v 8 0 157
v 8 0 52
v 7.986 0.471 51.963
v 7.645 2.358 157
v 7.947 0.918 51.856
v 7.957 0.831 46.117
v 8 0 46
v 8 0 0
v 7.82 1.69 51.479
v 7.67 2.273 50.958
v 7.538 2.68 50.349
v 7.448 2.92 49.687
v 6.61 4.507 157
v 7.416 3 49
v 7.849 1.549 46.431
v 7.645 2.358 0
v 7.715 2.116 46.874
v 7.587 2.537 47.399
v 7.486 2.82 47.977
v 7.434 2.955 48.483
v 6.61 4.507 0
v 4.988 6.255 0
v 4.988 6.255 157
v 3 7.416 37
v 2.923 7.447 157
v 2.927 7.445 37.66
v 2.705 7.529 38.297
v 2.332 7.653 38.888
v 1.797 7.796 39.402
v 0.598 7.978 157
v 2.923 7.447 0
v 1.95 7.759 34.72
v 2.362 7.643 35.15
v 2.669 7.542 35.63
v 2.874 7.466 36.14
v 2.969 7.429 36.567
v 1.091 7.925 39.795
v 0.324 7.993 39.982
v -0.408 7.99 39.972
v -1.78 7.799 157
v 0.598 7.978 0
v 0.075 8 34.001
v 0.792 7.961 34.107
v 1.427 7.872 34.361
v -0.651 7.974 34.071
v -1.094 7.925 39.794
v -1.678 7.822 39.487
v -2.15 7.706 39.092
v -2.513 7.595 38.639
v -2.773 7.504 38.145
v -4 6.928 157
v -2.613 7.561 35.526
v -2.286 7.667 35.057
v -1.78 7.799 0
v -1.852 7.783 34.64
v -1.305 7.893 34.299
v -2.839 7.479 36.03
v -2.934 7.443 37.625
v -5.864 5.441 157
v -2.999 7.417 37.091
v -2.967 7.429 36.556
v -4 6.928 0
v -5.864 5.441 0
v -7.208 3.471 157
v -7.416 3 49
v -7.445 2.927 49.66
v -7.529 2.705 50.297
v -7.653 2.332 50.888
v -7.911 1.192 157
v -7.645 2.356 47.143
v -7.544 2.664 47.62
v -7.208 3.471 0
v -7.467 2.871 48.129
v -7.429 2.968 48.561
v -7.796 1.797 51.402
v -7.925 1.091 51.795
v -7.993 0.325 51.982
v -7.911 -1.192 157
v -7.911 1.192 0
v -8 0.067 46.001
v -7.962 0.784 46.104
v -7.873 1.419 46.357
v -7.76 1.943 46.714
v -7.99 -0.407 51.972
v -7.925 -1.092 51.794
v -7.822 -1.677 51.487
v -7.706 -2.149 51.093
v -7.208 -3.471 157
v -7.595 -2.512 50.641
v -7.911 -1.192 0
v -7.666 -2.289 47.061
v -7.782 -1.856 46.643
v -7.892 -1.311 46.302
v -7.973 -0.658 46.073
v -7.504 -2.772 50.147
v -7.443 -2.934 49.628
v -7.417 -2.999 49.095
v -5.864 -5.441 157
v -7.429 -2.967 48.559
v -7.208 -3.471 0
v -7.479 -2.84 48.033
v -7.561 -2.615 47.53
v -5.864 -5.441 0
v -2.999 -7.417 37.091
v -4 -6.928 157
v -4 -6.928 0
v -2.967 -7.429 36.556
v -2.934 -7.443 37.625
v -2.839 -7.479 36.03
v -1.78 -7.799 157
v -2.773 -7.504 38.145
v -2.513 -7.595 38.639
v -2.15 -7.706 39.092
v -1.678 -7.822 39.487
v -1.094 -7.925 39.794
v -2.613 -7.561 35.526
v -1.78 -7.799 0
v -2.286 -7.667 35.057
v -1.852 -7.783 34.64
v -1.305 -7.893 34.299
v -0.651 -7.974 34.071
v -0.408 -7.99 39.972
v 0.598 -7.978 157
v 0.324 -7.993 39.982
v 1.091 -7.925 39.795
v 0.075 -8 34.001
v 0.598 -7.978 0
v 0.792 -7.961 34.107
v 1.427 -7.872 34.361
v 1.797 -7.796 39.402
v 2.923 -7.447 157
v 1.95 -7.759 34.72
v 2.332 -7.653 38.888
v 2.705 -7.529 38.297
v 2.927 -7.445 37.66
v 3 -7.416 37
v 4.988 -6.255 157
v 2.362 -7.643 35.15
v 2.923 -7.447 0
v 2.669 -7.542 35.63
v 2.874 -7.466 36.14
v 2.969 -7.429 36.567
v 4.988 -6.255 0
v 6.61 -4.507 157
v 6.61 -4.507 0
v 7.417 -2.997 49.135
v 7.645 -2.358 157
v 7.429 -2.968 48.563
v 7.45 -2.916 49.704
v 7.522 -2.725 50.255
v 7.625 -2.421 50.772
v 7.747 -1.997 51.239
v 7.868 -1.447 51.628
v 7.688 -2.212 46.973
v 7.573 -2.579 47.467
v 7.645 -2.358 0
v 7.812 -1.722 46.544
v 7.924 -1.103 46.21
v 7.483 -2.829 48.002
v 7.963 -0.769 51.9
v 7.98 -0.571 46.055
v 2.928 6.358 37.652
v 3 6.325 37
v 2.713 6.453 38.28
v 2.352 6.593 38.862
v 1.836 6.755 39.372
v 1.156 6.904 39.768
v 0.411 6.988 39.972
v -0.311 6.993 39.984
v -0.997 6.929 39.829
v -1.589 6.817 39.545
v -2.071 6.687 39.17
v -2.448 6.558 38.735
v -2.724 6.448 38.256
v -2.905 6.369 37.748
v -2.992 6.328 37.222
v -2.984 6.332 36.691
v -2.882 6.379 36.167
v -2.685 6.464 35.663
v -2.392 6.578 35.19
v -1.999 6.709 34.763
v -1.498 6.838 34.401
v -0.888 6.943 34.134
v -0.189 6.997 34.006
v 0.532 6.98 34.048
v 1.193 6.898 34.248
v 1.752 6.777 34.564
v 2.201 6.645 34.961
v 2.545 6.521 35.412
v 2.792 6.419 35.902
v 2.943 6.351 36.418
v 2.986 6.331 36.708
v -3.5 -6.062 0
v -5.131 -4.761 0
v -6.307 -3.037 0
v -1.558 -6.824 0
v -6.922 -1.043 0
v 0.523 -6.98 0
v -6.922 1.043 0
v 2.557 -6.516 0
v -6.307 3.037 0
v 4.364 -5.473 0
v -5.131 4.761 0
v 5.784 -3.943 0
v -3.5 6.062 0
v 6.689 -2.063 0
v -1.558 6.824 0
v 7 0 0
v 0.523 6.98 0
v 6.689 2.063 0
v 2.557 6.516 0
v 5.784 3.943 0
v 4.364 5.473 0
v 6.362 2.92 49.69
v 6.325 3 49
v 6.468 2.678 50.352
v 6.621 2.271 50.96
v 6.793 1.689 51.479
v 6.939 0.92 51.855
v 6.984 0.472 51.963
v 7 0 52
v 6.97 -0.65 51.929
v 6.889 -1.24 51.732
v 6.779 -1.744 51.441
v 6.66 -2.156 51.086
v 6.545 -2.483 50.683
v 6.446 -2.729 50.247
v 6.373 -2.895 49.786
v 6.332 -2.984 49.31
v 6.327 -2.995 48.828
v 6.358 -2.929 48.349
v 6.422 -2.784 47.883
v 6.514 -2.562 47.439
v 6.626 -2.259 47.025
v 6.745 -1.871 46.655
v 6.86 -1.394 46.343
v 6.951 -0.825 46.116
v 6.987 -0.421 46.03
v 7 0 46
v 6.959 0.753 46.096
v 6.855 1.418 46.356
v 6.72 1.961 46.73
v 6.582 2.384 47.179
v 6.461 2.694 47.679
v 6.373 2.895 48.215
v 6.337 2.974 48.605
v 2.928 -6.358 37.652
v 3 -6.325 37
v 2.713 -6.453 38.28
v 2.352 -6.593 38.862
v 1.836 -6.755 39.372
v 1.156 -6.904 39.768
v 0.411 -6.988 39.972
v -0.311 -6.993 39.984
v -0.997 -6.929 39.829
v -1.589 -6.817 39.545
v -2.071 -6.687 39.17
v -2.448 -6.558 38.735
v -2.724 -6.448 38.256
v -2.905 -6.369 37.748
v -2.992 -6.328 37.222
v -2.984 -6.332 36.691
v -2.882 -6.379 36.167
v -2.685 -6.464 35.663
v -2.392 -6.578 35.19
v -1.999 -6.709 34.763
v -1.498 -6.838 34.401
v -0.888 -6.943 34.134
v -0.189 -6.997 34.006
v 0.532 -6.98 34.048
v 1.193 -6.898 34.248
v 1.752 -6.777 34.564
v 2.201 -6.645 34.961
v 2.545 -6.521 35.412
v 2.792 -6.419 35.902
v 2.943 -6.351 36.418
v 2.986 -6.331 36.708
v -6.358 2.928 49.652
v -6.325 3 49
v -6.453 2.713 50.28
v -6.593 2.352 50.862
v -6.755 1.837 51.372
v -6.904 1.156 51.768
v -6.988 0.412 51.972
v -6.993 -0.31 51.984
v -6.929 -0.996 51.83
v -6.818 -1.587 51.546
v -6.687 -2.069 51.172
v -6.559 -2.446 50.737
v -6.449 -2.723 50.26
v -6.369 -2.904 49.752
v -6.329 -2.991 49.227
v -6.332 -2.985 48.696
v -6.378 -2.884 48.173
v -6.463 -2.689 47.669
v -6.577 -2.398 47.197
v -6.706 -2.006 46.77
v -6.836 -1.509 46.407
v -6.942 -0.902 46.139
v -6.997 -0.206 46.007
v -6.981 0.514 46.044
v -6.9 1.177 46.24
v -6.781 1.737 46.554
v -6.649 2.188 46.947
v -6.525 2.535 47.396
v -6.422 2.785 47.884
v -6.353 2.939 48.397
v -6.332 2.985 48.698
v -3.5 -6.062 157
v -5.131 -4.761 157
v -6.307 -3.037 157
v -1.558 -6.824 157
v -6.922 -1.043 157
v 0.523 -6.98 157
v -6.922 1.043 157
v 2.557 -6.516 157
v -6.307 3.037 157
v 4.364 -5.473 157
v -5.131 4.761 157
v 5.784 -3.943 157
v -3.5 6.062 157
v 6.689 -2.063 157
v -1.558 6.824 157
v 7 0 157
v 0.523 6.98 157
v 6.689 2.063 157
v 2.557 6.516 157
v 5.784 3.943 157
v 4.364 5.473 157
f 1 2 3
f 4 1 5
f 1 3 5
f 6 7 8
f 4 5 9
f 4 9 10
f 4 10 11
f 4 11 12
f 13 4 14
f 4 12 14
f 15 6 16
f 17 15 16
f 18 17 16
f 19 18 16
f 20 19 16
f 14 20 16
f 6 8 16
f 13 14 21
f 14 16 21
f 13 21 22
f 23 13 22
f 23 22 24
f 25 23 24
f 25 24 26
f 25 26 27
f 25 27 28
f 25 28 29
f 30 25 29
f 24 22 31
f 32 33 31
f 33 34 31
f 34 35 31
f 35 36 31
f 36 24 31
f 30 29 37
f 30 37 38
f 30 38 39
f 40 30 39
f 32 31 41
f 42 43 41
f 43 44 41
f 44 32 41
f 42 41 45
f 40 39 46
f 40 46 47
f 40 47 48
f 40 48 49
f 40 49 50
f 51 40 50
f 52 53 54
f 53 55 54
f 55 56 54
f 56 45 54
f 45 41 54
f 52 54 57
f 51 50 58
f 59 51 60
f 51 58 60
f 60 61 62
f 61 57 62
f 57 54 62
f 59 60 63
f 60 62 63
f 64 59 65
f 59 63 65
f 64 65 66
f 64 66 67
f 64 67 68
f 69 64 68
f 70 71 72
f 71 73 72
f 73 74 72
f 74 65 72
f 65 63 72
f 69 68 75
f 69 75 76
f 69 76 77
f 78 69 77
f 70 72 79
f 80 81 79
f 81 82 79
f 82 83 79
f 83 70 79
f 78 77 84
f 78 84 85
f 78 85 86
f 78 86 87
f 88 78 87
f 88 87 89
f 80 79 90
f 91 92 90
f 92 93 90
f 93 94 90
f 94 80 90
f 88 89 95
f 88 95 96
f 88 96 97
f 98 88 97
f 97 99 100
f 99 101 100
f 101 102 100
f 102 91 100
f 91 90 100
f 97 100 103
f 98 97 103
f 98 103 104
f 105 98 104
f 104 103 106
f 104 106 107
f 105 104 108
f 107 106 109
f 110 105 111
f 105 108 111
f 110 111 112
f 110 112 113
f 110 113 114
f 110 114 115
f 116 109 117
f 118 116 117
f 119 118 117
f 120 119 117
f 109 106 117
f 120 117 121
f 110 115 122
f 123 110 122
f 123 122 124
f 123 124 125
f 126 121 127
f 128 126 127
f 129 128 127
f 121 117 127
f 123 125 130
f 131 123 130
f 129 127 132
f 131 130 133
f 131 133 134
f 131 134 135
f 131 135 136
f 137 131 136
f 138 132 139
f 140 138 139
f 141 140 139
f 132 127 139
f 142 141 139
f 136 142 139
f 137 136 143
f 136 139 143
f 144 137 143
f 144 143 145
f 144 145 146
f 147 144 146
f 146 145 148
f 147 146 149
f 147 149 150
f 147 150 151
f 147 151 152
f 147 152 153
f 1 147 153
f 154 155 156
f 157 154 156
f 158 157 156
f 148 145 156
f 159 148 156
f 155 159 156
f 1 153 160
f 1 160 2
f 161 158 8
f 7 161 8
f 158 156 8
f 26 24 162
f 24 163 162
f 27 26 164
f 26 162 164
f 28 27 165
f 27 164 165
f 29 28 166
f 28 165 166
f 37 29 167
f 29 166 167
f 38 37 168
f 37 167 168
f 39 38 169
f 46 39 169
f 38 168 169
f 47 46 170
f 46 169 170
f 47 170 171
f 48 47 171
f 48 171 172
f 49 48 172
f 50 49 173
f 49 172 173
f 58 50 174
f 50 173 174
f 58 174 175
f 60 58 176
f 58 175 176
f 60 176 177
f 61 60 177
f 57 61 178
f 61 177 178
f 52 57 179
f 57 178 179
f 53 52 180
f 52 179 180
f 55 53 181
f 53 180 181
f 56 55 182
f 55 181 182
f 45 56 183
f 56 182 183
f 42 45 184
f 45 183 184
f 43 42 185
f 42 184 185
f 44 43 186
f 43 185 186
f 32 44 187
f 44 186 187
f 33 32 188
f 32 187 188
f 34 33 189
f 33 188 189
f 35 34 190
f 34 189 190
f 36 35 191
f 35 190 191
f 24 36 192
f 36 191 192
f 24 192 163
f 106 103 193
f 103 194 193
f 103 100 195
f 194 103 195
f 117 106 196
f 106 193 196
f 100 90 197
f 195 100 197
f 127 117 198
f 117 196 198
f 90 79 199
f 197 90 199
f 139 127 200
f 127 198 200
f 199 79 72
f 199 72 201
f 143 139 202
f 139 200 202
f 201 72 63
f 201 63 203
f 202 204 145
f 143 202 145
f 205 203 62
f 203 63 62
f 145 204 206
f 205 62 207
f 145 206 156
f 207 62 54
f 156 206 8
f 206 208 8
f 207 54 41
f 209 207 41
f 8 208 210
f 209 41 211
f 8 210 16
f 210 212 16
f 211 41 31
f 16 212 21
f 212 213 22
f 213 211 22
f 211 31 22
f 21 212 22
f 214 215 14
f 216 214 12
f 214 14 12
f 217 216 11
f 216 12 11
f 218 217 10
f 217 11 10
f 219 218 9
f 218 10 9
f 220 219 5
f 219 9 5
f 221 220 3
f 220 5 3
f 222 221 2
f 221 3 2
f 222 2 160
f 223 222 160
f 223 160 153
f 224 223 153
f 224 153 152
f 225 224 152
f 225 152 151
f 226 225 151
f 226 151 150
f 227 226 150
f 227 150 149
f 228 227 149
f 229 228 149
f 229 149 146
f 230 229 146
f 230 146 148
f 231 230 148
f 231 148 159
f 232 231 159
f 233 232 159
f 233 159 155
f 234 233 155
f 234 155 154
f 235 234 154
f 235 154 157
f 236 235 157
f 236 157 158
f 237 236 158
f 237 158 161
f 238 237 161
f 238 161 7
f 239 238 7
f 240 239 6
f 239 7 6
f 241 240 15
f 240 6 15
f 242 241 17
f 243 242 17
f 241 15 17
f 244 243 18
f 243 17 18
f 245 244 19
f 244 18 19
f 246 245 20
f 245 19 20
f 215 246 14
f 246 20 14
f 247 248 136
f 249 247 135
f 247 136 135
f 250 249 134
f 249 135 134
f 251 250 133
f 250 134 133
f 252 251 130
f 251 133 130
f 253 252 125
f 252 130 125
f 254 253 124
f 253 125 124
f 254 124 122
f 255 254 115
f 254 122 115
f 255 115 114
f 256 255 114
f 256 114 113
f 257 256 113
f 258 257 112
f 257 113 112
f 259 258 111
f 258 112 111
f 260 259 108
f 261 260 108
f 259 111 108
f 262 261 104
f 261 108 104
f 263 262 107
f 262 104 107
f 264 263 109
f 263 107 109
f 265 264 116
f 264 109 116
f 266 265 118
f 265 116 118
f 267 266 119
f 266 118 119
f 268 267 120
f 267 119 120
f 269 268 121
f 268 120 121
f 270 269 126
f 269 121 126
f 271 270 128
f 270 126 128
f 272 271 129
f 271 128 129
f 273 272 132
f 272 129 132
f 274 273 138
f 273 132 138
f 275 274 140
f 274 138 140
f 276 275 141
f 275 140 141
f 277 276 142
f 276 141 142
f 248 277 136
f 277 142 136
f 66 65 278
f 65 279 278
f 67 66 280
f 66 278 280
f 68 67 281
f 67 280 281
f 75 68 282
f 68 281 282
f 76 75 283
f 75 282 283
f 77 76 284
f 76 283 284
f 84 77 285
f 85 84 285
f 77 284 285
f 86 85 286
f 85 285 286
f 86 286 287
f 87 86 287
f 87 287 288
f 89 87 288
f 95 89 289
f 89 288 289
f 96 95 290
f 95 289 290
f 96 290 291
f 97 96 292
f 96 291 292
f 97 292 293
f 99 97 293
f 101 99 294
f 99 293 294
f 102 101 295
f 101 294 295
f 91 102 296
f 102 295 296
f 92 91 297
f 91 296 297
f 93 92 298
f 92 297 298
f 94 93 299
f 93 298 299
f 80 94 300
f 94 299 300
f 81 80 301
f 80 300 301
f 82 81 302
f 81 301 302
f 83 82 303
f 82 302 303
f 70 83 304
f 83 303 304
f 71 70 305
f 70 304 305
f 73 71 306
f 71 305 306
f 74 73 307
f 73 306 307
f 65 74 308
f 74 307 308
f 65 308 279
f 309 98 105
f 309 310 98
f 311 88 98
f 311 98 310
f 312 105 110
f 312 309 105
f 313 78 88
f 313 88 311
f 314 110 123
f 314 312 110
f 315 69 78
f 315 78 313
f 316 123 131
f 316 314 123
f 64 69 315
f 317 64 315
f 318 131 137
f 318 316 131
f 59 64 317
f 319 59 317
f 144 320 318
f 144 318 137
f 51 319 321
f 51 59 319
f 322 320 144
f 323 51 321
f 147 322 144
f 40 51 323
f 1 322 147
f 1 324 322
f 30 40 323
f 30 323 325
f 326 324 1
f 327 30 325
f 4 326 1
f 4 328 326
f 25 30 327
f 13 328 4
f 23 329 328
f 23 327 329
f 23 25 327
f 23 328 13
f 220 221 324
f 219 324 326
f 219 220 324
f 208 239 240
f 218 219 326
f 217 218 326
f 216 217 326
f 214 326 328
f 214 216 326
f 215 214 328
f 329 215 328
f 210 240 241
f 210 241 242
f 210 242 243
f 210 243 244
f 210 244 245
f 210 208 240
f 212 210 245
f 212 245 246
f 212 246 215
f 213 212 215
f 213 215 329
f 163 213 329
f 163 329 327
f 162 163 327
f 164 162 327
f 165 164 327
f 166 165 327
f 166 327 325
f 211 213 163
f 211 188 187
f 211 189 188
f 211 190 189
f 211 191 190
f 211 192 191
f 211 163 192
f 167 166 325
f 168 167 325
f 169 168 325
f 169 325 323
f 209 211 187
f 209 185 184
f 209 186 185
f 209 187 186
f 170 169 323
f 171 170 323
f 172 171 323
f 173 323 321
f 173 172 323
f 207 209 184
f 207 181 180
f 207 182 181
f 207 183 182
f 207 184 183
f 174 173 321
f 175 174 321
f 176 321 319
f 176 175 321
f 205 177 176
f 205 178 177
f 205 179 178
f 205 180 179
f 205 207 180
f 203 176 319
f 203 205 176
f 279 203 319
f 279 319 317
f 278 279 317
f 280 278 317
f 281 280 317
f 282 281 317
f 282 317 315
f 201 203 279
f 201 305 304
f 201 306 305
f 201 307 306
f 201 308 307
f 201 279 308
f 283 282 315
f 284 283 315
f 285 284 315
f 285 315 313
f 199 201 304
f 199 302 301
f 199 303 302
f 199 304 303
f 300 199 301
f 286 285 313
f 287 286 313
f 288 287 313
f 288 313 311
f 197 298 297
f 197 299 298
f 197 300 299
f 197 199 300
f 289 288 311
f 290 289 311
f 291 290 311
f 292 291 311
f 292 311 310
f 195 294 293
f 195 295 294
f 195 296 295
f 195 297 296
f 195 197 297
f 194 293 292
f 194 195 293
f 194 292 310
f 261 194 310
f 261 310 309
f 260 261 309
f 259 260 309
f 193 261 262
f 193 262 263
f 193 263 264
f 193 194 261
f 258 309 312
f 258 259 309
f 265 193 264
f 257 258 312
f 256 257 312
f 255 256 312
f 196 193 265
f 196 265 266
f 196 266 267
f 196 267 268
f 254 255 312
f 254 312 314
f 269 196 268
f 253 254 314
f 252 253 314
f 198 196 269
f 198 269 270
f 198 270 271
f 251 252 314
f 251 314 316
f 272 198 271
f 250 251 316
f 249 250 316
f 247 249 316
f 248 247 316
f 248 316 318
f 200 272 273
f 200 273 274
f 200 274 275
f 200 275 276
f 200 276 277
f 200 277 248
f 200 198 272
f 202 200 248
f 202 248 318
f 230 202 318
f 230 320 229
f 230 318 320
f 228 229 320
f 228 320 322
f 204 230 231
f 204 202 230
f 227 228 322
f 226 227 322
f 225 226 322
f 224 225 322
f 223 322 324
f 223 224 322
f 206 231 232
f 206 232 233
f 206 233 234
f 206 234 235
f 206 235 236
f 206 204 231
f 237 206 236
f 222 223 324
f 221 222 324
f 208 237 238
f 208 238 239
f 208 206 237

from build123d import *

# Parameters (mm, degrees)
F0_R     = 8
F0_R_2   = 7
F1_DEPTH = 157
F2_R     = 3
F3_DEPTH = 25
F4_R     = 3
F5_DEPTH = 12.5


with BuildPart() as f1:
    # F0 (on Top) → F1 (new body)
    with BuildSketch(Plane.XY):
        Circle(F0_R)
        Circle(F0_R_2, mode=Mode.SUBTRACT)
    extrude(amount=F1_DEPTH)

    # F2 (on Front) → F3 (cut, symmetric)
    with BuildSketch(Plane.XZ):
        with Locations((0, 37)):
            Circle(F2_R)
    extrude(amount=F3_DEPTH, both=True, mode=Mode.SUBTRACT)

    # F4 (on Right) → F5 (cut, symmetric)
    with BuildSketch(Plane.YZ):
        with Locations((0, 49)):
            Circle(F4_R)
    extrude(amount=F5_DEPTH, both=True, mode=Mode.SUBTRACT)


solid = f1.part
